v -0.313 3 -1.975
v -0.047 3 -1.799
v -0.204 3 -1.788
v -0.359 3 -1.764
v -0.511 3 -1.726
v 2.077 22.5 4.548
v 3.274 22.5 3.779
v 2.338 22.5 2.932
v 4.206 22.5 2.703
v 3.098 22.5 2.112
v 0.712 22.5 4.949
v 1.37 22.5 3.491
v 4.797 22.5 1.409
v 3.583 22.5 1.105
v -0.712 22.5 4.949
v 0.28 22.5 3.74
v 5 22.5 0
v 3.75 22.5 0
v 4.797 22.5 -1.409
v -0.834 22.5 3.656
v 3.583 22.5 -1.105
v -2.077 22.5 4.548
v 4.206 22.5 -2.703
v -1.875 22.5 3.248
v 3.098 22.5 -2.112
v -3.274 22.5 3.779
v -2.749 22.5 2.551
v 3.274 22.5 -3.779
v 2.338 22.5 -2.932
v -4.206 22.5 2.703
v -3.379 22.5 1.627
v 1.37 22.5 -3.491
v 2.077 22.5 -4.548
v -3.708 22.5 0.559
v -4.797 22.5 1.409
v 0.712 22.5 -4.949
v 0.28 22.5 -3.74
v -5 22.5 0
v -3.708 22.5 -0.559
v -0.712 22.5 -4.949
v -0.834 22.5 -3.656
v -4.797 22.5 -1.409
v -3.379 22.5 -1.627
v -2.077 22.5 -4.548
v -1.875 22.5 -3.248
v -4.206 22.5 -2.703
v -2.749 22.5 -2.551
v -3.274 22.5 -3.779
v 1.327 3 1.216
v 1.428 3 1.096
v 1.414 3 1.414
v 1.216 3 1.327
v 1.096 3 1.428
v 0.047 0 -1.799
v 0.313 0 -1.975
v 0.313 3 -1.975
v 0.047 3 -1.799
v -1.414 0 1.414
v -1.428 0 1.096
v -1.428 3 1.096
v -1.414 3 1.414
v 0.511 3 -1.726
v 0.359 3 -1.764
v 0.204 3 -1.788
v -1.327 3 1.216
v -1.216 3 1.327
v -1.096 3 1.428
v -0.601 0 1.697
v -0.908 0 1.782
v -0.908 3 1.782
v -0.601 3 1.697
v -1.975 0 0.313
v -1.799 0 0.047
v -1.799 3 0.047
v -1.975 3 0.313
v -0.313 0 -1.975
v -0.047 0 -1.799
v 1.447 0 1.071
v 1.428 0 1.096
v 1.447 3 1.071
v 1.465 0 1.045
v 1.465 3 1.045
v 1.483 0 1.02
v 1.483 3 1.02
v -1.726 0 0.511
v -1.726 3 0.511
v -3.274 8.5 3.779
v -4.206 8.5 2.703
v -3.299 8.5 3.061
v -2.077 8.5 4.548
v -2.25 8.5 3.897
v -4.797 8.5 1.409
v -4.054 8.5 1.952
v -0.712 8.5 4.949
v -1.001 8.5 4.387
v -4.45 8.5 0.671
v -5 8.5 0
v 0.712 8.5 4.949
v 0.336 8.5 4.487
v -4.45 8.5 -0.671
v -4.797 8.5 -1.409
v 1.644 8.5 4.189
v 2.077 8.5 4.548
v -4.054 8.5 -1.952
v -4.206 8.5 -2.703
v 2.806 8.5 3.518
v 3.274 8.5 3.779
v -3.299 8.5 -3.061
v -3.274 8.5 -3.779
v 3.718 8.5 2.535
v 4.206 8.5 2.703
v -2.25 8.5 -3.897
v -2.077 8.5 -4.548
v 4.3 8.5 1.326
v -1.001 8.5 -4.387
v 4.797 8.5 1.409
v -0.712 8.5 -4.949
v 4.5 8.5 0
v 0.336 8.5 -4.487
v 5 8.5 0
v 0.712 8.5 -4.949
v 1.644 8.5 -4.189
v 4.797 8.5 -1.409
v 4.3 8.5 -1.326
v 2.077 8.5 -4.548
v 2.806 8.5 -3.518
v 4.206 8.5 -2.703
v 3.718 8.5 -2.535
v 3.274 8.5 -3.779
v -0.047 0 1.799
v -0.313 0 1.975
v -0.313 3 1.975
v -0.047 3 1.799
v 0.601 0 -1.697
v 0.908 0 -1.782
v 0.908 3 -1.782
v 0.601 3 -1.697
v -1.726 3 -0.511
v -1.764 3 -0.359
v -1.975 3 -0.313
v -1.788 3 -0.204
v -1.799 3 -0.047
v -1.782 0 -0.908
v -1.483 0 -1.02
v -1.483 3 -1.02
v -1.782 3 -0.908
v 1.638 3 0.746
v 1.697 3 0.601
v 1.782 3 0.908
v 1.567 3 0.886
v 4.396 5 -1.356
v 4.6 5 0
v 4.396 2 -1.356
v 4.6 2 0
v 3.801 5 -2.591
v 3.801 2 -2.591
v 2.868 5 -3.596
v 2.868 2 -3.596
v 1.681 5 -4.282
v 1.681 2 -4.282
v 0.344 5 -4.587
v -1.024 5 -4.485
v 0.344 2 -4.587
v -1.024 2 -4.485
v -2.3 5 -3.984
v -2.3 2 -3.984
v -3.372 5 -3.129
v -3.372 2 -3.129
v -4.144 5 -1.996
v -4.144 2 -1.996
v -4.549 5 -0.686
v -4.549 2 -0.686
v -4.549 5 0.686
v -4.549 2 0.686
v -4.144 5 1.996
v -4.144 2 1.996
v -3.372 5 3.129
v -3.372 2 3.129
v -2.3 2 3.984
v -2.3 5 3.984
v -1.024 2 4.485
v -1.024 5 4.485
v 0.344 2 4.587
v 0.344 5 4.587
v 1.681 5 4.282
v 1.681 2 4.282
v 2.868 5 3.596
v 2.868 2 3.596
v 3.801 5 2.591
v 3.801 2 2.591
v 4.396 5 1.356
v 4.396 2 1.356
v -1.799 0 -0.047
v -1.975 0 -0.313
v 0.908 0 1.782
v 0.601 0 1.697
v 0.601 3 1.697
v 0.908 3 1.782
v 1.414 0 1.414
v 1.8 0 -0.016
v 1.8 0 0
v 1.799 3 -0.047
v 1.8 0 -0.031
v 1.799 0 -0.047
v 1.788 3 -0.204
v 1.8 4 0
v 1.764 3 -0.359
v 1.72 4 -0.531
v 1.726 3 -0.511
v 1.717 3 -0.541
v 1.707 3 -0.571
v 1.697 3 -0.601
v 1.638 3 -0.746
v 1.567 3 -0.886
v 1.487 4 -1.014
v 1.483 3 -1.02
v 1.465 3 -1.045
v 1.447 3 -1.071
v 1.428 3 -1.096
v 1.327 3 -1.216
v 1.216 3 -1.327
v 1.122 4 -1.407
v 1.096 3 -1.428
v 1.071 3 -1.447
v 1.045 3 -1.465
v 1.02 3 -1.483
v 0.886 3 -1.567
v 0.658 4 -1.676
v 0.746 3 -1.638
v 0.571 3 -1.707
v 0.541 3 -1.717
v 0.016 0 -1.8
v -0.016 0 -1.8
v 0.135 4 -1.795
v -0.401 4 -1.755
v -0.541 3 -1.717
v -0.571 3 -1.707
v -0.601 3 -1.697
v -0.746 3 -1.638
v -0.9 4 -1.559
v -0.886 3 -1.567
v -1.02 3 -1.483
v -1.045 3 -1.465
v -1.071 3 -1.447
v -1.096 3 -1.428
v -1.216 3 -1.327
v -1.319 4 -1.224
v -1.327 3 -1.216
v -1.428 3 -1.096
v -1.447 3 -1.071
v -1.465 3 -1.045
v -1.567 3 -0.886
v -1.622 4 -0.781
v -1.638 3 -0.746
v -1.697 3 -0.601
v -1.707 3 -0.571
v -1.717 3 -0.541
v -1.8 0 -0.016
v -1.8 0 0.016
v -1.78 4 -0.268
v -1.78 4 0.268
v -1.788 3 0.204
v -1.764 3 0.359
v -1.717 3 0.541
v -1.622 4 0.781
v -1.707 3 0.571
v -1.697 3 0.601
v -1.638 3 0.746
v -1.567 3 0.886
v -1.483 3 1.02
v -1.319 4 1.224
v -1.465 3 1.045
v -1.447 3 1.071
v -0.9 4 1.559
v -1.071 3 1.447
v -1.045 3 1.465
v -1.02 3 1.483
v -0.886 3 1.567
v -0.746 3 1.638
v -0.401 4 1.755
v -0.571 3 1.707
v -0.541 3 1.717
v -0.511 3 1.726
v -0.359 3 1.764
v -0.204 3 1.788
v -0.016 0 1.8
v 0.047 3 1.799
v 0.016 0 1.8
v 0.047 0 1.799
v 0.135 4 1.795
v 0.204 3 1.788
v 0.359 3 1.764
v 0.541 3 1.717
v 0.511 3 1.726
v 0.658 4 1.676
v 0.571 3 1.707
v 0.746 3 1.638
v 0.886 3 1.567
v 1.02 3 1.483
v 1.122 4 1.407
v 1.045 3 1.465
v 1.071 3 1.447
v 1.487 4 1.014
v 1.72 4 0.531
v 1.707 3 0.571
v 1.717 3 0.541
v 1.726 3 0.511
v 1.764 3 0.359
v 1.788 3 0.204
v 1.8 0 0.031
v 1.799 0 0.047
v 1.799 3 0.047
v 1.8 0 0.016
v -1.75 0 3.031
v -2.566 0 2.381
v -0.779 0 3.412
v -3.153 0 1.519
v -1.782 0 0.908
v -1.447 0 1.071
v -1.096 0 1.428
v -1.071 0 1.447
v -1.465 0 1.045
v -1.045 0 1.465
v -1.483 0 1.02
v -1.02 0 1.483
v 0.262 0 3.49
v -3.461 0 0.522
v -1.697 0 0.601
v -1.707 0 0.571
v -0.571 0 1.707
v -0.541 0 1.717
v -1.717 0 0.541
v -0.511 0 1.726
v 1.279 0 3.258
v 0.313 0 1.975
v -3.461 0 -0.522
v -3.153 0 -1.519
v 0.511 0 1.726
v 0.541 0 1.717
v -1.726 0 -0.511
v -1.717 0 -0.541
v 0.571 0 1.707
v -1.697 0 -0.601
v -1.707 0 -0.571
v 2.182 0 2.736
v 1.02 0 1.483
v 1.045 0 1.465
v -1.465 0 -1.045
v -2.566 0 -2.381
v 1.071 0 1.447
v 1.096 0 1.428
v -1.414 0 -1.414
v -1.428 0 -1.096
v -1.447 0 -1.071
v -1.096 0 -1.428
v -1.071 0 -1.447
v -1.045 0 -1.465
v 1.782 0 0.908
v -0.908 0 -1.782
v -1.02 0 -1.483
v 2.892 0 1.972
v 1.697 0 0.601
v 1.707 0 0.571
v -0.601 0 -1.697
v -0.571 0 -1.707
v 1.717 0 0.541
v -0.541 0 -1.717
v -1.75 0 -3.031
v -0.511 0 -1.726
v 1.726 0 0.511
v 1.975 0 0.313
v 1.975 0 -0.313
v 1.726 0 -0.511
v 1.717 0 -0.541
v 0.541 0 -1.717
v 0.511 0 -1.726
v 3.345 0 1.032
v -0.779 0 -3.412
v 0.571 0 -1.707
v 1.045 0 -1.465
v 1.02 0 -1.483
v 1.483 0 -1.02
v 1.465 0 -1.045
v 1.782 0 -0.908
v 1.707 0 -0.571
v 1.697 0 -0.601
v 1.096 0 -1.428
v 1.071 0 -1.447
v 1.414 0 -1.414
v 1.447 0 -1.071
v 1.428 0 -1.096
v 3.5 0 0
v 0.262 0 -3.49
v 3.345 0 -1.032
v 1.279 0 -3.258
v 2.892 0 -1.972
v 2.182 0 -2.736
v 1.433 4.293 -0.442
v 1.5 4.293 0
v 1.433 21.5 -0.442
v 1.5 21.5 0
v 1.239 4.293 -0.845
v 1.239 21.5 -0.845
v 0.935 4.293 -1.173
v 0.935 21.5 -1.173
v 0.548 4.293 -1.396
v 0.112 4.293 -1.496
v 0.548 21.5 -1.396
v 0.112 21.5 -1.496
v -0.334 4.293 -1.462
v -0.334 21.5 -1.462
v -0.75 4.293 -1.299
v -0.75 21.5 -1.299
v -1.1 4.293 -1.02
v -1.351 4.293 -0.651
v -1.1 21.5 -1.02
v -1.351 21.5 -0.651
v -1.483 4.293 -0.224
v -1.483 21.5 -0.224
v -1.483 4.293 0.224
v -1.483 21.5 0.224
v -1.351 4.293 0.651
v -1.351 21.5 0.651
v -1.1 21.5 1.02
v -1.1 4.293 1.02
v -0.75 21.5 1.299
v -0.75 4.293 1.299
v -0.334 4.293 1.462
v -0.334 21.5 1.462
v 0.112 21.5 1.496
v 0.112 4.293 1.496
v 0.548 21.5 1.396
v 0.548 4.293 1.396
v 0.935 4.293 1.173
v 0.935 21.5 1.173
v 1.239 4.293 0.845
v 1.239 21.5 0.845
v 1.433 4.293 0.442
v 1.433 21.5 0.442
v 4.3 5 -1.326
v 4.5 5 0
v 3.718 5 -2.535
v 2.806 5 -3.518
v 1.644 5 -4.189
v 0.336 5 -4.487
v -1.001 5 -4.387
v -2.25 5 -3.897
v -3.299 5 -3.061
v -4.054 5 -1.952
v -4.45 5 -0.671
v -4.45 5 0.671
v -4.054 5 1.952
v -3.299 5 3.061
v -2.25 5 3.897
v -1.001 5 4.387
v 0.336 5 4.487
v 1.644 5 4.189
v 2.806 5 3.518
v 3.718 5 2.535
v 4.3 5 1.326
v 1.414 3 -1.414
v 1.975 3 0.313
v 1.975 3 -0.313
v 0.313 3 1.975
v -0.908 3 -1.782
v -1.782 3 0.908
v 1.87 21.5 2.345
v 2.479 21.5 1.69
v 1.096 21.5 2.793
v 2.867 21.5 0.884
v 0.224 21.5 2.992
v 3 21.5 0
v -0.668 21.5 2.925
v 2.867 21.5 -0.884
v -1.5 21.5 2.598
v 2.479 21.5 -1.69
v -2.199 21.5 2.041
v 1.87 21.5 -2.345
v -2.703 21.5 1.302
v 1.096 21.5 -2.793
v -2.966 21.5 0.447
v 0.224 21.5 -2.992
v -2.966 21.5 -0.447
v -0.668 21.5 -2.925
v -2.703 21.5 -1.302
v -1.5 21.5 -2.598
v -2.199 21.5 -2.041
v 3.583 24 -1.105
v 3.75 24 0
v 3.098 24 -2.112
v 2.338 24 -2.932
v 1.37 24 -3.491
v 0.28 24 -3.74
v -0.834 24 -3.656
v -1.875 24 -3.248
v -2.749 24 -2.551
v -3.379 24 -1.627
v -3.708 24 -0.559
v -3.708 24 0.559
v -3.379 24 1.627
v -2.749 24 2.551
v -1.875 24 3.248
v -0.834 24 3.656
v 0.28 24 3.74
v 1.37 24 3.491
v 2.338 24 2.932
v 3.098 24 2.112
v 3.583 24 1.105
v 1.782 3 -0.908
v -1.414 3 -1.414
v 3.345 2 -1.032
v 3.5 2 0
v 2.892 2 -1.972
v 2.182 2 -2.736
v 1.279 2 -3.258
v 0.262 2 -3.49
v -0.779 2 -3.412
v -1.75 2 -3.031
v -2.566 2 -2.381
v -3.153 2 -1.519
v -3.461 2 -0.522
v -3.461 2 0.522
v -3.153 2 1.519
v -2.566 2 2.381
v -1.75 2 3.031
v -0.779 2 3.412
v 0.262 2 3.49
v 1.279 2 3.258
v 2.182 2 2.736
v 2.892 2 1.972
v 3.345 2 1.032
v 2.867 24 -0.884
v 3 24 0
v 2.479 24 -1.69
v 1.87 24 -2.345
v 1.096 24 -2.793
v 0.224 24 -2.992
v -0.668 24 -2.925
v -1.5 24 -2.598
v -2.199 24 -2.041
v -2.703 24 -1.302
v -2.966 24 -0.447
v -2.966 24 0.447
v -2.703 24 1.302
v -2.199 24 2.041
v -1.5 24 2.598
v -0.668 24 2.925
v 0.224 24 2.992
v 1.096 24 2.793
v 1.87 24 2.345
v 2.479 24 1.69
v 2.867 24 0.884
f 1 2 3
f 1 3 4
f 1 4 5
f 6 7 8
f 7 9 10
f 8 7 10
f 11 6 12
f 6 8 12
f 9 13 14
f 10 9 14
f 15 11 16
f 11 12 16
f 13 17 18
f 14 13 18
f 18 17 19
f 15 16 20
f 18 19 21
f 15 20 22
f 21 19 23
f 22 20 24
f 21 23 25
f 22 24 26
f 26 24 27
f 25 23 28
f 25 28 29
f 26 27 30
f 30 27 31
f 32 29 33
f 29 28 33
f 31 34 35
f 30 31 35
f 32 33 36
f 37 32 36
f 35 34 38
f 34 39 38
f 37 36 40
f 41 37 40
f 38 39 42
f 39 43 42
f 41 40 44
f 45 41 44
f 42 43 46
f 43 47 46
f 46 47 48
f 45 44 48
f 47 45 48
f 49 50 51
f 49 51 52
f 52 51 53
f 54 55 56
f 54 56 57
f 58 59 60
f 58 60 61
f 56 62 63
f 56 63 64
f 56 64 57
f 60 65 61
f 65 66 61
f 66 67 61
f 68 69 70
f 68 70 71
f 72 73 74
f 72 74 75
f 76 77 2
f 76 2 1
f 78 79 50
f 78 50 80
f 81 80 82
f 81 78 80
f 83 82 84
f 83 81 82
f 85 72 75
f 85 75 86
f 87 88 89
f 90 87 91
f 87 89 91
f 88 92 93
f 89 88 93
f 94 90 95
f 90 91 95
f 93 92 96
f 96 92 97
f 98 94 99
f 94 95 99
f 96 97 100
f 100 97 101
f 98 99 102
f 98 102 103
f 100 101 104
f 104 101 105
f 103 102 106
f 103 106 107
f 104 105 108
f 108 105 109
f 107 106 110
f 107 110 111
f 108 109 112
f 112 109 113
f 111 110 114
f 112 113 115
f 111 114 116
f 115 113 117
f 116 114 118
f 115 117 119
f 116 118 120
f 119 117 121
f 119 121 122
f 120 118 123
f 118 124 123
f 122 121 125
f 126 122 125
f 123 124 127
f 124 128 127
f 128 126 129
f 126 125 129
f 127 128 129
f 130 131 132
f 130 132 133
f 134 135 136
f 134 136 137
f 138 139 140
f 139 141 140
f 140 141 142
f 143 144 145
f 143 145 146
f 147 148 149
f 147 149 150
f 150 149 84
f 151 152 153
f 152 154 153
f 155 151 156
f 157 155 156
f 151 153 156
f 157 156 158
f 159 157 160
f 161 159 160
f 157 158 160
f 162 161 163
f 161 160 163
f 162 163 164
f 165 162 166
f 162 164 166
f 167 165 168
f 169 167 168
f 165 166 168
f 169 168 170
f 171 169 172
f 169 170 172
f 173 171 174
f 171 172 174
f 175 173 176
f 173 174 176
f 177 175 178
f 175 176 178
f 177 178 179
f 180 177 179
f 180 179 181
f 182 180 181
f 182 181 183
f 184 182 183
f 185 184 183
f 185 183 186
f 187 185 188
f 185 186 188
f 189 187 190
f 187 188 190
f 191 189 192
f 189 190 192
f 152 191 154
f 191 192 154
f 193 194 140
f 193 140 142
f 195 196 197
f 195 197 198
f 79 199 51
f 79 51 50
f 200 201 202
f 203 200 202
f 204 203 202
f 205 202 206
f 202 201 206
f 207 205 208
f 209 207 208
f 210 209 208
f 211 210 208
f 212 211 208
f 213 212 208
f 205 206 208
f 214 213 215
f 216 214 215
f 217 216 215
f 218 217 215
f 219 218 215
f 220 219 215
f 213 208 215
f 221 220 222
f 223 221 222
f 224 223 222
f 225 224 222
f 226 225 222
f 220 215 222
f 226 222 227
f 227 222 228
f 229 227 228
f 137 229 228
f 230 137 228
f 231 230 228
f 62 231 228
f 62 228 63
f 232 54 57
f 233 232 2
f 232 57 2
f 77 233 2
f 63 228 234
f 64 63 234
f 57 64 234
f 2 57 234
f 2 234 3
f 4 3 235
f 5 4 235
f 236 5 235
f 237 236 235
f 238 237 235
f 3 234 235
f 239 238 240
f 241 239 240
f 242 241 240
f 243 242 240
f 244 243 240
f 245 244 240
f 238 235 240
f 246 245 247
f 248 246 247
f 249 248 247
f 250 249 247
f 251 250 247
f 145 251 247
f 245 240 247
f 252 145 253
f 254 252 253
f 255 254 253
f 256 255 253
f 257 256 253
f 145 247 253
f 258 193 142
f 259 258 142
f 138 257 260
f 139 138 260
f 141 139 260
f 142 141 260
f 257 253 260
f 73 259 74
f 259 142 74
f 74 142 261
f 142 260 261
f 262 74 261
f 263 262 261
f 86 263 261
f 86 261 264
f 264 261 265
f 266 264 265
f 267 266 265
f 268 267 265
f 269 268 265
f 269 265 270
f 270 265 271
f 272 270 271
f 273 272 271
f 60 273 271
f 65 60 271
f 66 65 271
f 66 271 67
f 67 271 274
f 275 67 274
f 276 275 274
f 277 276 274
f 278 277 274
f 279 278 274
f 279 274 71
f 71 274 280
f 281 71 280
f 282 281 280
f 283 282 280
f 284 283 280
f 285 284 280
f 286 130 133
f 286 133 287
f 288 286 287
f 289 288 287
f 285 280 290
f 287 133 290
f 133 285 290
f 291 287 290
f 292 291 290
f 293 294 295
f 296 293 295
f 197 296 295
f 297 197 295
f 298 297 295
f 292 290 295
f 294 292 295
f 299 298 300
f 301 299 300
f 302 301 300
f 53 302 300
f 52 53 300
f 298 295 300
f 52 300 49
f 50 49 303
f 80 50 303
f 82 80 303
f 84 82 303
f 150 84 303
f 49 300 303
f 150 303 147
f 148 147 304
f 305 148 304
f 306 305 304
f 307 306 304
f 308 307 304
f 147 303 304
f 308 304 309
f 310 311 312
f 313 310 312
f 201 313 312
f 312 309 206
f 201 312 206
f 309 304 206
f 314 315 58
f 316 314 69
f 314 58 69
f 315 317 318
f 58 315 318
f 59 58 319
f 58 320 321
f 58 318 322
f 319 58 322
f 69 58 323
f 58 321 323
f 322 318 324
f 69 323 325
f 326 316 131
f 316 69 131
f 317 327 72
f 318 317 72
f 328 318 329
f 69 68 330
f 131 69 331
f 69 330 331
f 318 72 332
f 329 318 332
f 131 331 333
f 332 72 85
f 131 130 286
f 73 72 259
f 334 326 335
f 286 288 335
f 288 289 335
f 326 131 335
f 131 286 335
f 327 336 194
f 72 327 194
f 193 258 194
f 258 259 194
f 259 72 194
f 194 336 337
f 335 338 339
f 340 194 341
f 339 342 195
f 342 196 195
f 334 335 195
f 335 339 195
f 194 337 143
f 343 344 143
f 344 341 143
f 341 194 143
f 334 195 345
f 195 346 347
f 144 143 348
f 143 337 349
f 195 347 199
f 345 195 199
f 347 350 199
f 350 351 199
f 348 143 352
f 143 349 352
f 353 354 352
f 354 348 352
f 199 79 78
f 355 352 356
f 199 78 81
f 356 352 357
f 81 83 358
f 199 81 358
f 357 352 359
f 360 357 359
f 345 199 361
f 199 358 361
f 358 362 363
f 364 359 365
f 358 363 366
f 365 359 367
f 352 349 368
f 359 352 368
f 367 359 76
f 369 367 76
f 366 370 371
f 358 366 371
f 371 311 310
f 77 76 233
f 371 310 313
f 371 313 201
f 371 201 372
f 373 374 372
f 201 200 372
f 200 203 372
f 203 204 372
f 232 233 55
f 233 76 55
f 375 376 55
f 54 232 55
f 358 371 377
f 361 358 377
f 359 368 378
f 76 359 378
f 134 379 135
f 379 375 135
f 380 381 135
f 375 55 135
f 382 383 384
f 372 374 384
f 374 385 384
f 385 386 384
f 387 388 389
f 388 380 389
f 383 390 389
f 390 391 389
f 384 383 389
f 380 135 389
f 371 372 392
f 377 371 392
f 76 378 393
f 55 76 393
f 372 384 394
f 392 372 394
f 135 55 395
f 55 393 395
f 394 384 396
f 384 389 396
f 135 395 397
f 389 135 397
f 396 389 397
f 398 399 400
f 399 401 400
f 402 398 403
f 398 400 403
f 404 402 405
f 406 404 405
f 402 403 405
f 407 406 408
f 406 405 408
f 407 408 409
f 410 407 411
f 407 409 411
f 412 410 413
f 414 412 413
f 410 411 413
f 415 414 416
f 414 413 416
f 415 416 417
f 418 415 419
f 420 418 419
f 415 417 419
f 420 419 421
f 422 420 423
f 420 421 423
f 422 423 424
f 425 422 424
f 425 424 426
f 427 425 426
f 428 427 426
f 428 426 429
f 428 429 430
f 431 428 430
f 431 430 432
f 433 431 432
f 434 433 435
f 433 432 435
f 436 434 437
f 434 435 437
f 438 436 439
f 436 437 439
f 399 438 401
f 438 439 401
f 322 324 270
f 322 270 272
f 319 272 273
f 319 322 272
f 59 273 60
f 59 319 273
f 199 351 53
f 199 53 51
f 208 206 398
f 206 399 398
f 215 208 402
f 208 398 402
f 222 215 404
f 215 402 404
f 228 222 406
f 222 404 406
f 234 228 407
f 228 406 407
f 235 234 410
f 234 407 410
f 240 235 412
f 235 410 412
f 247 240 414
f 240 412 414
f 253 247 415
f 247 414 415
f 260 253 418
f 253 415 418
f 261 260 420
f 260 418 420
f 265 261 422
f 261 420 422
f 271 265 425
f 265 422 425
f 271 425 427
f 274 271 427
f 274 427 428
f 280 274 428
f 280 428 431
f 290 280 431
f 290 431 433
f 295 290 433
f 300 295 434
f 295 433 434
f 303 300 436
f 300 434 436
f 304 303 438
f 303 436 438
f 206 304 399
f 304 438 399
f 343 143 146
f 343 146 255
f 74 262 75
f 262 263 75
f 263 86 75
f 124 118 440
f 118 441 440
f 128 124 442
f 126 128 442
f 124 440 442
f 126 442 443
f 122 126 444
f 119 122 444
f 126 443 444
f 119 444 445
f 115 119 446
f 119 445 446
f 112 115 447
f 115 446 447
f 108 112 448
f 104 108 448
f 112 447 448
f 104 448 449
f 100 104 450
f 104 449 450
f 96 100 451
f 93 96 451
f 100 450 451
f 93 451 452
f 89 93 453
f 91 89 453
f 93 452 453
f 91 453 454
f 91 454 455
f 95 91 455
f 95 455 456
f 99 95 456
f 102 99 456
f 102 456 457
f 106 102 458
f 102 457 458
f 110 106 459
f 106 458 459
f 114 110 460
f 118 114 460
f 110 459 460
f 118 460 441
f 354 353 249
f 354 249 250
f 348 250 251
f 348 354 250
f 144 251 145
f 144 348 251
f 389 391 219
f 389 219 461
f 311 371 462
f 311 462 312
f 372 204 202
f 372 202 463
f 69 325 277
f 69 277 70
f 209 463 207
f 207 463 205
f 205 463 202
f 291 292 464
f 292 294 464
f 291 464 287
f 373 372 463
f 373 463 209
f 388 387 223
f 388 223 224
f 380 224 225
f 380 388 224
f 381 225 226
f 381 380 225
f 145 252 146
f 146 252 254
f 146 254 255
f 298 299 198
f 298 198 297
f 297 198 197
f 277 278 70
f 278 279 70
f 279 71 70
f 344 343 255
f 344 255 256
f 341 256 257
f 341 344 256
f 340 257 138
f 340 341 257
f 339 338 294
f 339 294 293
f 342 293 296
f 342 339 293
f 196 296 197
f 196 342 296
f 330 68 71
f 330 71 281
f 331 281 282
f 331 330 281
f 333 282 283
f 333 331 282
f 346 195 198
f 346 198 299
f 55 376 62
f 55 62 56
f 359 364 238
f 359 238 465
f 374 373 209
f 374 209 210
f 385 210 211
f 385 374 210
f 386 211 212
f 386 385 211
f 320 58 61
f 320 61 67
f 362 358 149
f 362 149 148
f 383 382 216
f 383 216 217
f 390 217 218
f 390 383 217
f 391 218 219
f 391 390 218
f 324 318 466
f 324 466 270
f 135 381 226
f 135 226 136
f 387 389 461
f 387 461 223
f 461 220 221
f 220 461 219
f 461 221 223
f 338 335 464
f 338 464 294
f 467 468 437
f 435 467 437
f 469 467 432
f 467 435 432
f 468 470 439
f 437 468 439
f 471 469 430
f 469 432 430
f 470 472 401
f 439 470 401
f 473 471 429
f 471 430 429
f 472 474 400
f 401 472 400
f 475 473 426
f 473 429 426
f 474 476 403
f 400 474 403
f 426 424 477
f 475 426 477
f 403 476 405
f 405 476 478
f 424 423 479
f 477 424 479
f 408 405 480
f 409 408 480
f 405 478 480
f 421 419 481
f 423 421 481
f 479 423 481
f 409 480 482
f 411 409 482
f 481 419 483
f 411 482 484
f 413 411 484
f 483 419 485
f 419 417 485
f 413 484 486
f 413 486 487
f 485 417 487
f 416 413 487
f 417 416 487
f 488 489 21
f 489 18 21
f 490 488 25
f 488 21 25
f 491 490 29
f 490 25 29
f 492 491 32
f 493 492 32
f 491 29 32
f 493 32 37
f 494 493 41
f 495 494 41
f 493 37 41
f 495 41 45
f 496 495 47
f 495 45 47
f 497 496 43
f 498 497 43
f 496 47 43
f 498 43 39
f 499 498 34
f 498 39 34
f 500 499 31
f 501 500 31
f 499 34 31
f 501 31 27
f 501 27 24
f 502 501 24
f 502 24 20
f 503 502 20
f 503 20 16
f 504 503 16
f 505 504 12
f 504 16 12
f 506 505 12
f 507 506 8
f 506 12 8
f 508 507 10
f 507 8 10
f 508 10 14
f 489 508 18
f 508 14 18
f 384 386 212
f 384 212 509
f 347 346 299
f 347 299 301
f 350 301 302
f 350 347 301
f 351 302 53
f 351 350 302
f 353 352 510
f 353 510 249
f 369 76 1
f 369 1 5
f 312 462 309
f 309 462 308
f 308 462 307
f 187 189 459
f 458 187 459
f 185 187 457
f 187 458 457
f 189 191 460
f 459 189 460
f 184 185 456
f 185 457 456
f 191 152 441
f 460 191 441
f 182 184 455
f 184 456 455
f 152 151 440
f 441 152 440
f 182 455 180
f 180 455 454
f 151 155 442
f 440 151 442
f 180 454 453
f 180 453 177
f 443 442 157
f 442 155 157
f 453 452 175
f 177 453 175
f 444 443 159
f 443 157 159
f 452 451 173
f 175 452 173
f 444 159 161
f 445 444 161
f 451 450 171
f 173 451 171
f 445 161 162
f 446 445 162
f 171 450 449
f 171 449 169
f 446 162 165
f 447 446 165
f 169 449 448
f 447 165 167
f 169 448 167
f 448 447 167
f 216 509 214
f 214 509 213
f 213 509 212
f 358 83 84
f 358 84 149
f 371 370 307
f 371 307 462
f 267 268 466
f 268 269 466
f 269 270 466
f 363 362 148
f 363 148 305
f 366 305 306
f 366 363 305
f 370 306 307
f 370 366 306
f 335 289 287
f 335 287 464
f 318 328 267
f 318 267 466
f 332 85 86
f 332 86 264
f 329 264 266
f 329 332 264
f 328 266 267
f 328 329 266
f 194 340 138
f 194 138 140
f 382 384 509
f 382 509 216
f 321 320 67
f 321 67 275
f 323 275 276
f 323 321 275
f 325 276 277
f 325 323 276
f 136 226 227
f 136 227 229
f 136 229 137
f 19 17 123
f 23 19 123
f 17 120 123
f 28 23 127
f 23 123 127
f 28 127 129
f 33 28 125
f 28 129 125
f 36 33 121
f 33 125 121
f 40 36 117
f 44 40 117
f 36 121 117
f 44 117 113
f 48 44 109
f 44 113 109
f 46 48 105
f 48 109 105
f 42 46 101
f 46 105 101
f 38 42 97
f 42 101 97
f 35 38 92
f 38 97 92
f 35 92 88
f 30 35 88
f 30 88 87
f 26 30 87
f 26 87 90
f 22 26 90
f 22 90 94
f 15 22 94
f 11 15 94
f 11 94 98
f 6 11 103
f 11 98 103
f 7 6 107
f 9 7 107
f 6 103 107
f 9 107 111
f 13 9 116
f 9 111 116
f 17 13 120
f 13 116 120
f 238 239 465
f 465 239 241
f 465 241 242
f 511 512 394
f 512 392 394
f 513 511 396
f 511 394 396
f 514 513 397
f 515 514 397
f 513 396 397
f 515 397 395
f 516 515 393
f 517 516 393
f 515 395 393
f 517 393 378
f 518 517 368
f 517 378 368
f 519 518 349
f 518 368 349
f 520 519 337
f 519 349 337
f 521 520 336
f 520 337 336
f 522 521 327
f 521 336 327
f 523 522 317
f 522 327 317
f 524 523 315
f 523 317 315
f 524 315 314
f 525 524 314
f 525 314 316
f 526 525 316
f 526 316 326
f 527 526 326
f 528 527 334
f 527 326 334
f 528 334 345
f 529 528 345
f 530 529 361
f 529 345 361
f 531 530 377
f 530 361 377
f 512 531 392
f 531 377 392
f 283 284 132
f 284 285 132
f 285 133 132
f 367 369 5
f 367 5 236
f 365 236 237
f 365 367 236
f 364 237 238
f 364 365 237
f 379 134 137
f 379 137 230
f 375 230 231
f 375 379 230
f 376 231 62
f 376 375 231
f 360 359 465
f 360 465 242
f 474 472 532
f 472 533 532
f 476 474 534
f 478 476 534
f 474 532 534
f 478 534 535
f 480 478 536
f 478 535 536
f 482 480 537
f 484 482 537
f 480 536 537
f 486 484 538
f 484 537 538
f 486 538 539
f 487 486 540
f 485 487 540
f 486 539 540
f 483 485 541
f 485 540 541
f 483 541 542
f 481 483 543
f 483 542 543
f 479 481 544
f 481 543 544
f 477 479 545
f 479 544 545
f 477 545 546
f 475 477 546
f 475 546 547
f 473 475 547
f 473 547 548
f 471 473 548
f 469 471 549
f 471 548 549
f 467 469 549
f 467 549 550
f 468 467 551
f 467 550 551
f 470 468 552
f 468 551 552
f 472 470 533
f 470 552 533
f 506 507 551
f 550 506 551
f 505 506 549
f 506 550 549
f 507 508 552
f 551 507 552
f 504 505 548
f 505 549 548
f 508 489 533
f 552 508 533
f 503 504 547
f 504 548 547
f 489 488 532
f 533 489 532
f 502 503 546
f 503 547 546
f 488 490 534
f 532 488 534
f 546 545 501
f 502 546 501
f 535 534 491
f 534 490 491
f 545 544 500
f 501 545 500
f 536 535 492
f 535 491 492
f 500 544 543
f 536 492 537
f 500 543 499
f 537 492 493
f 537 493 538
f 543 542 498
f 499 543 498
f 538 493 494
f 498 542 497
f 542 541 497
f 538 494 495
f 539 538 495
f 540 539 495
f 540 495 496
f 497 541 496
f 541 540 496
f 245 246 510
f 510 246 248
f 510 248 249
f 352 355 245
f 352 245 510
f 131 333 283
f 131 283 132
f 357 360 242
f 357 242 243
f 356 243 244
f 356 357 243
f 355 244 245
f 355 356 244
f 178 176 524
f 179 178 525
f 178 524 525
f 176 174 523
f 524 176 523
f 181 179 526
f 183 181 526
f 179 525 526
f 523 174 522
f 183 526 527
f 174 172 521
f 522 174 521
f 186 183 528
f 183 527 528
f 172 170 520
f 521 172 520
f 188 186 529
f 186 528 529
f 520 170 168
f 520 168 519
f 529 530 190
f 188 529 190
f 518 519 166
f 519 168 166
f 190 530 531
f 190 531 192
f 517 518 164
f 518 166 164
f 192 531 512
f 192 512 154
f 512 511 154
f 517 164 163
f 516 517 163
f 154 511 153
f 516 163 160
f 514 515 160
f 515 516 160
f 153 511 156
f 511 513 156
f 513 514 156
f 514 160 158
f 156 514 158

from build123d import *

# Parameters (mm, degrees)
CUT_EXTRUDE_1_DEPTH = 3


with BuildPart() as part:
    # Эскиз1 → Повернуть1 (revolve)
    with BuildSketch(Plane.XY):
        Polygon((3.5, 0), (1.8, 0), (1.8, 4), (1.5, 4.292679061), (1.5, 21.5), (3, 21.5), (3, 24), (3.75, 24), (3.75, 22.5), (5, 22.5), (5, 8.5), (4.5, 8.5), (4.5, 5), (4.6, 5), (4.6, 2), (3.5, 2), align=None)
    revolve(axis=Axis((0, 0, 0), (0, 1, 0)))

    # Эскиз3 → Вырез-Вытянуть1 (cut)
    with BuildSketch(Plane.XZ):
        with BuildLine():
            Line((0.046977339, 1.799386876), (0.31286893, 1.975376681))
            Line((0.31286893, 1.975376681), (0.51136302, 1.72583541))
            ThreePointArc((0.51136302, 1.72583541), (0.55623059, 1.711901729), (0.600719228, 1.696801818))
            Line((0.600719228, 1.696801818), (0.907980999, 1.782013048))
            Line((0.907980999, 1.782013048), (1.019647604, 1.483347149))
            ThreePointArc((1.019647604, 1.483347149), (1.058013454, 1.45623059), (1.095658534, 1.428121975))
            Line((1.095658534, 1.428121975), (1.414213562, 1.414213562))
            Line((1.414213562, 1.414213562), (1.428121975, 1.095658534))
            ThreePointArc((1.428121975, 1.095658534), (1.45623059, 1.058013454), (1.483347149, 1.019647604))
            Line((1.483347149, 1.019647604), (1.782013048, 0.907980999))
            Line((1.782013048, 0.907980999), (1.696801818, 0.600719228))
            ThreePointArc((1.696801818, 0.600719228), (1.711901729, 0.55623059), (1.72583541, 0.51136302))
            Line((1.72583541, 0.51136302), (1.975376681, 0.31286893))
            Line((1.975376681, 0.31286893), (1.799386876, 0.046977339))
            ThreePointArc((1.799386876, 0.046977339), (1.8, 0), (1.799386876, -0.046977339))
            Line((1.799386876, -0.046977339), (1.975376681, -0.31286893))
            Line((1.975376681, -0.31286893), (1.72583541, -0.51136302))
            ThreePointArc((1.72583541, -0.51136302), (1.711901729, -0.55623059), (1.696801818, -0.600719228))
            Line((1.696801818, -0.600719228), (1.782013048, -0.907980999))
            Line((1.782013048, -0.907980999), (1.483347149, -1.019647604))
            ThreePointArc((1.483347149, -1.019647604), (1.45623059, -1.058013454), (1.428121975, -1.095658534))
            Line((1.428121975, -1.095658534), (1.414213562, -1.414213562))
            Line((1.414213562, -1.414213562), (1.095658534, -1.428121975))
            ThreePointArc((1.095658534, -1.428121975), (1.058013454, -1.45623059), (1.019647604, -1.483347149))
            Line((1.019647604, -1.483347149), (0.907980999, -1.782013048))
            Line((0.907980999, -1.782013048), (0.600719228, -1.696801818))
            ThreePointArc((0.600719228, -1.696801818), (0.55623059, -1.711901729), (0.51136302, -1.72583541))
            Line((0.51136302, -1.72583541), (0.31286893, -1.975376681))
            Line((0.31286893, -1.975376681), (0.046977339, -1.799386876))
            ThreePointArc((0.046977339, -1.799386876), (0, -1.8), (-0.046977339, -1.799386876))
            Line((-0.046977339, -1.799386876), (-0.31286893, -1.975376681))
            Line((-0.31286893, -1.975376681), (-0.51136302, -1.72583541))
            ThreePointArc((-0.51136302, -1.72583541), (-0.55623059, -1.711901729), (-0.600719228, -1.696801818))
            Line((-0.600719228, -1.696801818), (-0.907980999, -1.782013048))
            Line((-0.907980999, -1.782013048), (-1.019647604, -1.483347149))
            ThreePointArc((-1.019647604, -1.483347149), (-1.058013454, -1.45623059), (-1.095658534, -1.428121975))
            Line((-1.095658534, -1.428121975), (-1.414213562, -1.414213562))
            Line((-1.414213562, -1.414213562), (-1.428121975, -1.095658534))
            ThreePointArc((-1.428121975, -1.095658534), (-1.45623059, -1.058013454), (-1.483347149, -1.019647604))
            Line((-1.483347149, -1.019647604), (-1.782013048, -0.907980999))
            Line((-1.782013048, -0.907980999), (-1.696801818, -0.600719228))
            ThreePointArc((-1.696801818, -0.600719228), (-1.711901729, -0.55623059), (-1.72583541, -0.51136302))
            Line((-1.72583541, -0.51136302), (-1.975376681, -0.31286893))
            Line((-1.975376681, -0.31286893), (-1.799386876, -0.046977339))
            ThreePointArc((-1.799386876, -0.046977339), (-1.8, 0), (-1.799386876, 0.046977339))
            Line((-1.799386876, 0.046977339), (-1.975376681, 0.31286893))
            Line((-1.975376681, 0.31286893), (-1.72583541, 0.51136302))
            ThreePointArc((-1.72583541, 0.51136302), (-1.711901729, 0.55623059), (-1.696801818, 0.600719228))
            Line((-1.696801818, 0.600719228), (-1.782013048, 0.907980999))
            Line((-1.782013048, 0.907980999), (-1.483347149, 1.019647604))
            ThreePointArc((-1.483347149, 1.019647604), (-1.45623059, 1.058013454), (-1.428121975, 1.095658534))
            Line((-1.428121975, 1.095658534), (-1.414213562, 1.414213562))
            Line((-1.414213562, 1.414213562), (-1.095658534, 1.428121975))
            ThreePointArc((-1.095658534, 1.428121975), (-1.058013454, 1.45623059), (-1.019647604, 1.483347149))
            Line((-1.019647604, 1.483347149), (-0.907980999, 1.782013048))
            Line((-0.907980999, 1.782013048), (-0.600719228, 1.696801818))
            ThreePointArc((-0.600719228, 1.696801818), (-0.55623059, 1.711901729), (-0.51136302, 1.72583541))
            Line((-0.51136302, 1.72583541), (-0.31286893, 1.975376681))
            Line((-0.31286893, 1.975376681), (-0.046977339, 1.799386876))
            ThreePointArc((-0.046977339, 1.799386876), (0, 1.8), (0.046977339, 1.799386876))
        make_face()
    extrude(amount=-CUT_EXTRUDE_1_DEPTH, mode=Mode.SUBTRACT)


solid = part.part
